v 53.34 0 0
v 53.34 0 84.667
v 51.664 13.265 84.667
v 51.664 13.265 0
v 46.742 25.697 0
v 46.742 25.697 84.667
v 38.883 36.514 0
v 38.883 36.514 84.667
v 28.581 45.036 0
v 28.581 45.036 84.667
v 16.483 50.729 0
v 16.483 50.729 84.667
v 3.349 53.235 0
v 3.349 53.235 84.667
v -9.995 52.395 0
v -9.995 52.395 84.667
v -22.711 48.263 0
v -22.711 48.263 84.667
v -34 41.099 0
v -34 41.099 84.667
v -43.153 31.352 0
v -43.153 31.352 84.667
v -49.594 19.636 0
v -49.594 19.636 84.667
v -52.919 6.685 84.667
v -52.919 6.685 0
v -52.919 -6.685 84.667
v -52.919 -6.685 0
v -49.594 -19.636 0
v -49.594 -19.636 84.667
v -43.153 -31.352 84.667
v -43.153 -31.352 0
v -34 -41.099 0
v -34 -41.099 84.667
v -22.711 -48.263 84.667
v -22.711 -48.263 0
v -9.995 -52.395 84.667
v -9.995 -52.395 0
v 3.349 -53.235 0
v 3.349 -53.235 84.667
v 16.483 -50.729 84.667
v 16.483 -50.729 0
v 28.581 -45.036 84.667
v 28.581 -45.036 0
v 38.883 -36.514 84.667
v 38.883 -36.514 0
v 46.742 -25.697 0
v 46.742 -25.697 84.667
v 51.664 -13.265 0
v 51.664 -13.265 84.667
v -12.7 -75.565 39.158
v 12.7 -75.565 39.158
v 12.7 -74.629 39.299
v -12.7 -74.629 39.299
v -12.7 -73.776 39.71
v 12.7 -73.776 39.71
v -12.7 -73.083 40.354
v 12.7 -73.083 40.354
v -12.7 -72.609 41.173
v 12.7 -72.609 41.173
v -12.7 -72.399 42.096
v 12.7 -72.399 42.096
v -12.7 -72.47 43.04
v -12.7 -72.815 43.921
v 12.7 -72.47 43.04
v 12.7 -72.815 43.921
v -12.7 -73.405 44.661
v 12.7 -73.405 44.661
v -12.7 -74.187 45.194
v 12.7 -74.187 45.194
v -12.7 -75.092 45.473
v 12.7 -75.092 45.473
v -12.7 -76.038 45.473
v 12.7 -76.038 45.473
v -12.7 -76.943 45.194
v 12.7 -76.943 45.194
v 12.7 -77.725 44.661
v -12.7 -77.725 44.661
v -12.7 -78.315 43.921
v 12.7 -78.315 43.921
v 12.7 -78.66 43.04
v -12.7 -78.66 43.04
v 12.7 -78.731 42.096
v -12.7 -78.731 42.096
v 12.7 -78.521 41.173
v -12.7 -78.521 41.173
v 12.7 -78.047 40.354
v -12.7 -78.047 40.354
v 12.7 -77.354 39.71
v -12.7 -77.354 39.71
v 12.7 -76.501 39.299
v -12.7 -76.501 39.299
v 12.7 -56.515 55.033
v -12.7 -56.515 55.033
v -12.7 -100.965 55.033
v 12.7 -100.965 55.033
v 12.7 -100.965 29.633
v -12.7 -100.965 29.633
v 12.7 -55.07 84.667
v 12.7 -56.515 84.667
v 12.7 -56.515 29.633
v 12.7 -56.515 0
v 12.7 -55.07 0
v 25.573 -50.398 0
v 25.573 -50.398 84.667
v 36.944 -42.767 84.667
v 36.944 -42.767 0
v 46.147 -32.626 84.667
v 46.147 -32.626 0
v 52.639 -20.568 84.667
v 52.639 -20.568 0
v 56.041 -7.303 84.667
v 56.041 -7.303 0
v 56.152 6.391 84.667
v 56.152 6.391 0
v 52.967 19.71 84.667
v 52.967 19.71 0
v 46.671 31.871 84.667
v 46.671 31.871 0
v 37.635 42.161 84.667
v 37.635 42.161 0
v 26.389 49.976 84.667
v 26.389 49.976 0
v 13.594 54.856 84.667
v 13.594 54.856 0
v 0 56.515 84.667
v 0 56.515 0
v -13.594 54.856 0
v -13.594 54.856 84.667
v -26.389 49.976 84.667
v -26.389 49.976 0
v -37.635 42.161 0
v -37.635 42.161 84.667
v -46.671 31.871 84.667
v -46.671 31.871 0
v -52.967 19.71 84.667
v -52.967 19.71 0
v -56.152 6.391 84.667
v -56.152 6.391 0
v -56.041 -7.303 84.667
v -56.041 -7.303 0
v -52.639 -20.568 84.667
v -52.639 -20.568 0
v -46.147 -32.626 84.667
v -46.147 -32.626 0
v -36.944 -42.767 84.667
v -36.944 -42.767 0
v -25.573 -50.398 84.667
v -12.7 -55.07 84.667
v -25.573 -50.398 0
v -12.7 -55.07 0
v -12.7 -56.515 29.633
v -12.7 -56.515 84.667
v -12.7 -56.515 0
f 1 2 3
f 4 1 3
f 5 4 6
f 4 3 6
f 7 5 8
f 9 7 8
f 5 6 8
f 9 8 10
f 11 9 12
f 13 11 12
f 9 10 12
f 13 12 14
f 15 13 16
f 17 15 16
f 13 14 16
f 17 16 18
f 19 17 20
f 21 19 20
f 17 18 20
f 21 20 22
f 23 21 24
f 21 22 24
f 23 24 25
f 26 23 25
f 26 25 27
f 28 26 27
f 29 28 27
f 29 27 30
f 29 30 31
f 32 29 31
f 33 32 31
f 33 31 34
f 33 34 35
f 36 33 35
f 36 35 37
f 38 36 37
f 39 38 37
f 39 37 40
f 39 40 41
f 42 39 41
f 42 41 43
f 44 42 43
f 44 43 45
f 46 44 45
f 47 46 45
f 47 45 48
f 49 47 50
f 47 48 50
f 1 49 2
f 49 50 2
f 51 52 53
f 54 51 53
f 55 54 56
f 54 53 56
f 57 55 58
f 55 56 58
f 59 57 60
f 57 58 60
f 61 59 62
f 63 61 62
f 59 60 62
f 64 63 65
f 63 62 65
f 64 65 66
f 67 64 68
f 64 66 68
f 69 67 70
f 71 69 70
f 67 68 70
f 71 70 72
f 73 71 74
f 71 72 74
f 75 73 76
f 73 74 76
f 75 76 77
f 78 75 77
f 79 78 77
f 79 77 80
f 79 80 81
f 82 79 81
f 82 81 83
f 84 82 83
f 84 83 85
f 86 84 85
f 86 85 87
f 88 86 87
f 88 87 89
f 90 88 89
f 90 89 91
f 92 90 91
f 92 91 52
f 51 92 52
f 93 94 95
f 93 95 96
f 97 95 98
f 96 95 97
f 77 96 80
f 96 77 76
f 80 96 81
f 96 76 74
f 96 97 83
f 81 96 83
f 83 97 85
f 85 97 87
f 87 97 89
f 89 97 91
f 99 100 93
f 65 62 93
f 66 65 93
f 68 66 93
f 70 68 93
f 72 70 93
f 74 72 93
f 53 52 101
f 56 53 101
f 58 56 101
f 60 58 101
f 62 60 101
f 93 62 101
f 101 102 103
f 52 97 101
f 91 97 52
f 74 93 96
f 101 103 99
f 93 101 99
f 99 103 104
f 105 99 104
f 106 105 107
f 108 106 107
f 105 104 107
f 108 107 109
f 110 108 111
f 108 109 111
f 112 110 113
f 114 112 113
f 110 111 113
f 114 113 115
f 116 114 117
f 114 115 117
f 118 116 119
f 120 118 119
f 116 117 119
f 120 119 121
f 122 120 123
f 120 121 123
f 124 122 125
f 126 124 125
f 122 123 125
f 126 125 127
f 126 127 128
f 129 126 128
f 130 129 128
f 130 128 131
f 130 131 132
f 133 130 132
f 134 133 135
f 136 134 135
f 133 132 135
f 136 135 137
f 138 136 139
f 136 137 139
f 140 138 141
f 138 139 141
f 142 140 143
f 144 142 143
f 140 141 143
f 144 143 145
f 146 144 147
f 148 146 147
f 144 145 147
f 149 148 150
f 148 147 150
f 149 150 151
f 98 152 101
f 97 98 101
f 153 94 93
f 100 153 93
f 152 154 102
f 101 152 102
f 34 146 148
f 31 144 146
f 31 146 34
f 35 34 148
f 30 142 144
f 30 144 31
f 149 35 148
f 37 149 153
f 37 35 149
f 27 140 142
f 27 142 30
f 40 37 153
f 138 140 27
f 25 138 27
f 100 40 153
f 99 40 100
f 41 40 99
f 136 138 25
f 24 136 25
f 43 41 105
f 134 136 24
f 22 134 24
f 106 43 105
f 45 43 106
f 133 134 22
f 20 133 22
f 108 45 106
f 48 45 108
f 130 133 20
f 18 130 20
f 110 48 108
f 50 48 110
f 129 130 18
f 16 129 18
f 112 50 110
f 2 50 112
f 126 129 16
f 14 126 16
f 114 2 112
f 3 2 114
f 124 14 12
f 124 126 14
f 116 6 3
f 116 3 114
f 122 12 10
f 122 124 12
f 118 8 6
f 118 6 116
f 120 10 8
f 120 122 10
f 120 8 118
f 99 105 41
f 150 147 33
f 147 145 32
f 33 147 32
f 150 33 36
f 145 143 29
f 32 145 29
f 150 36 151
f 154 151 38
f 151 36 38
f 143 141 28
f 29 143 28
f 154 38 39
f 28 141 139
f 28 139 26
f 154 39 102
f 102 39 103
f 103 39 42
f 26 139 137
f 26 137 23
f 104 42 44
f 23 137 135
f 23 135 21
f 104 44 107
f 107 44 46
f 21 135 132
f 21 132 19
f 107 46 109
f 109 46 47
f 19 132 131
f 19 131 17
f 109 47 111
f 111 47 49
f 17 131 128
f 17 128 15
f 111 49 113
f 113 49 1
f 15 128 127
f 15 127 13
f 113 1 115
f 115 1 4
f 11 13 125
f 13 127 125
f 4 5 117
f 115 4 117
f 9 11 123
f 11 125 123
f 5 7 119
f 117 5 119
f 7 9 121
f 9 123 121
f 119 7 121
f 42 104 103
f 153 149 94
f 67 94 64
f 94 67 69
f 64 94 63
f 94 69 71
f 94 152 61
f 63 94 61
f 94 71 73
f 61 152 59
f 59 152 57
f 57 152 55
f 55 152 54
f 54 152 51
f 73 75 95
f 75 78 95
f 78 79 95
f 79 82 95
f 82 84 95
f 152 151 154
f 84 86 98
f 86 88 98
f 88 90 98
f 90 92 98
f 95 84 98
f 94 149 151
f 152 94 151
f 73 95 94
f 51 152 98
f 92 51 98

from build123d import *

# Parameters (mm, degrees)
BOSS_EXTRUDE1_DEPTH = 84.666666667
SKETCH2_R           = 53.34
CUT_EXTRUDE1_DEPTH  = 85.666666667
SKETCH3_W           = 25.4
SKETCH3_H           = 25.4
BOSS_EXTRUDE2_DEPTH = 44.45
SKETCH5_R           = 3.175
CUT_EXTRUDE2_DEPTH  = 70.215


with BuildPart() as part:
    # Sketch1 → Boss-Extrude1 (new body)
    with BuildSketch(Plane.XY):
        with BuildLine():
            Line((-12.7, -56.515), (12.7, -56.515))
            Line((12.7, -56.515), (12.7, -55.069548981))
            ThreePointArc((12.7, -55.069548981), (0, 56.515), (-12.7, -55.069548981))
            Line((-12.7, -55.069548981), (-12.7, -56.515))
        make_face()
    extrude(amount=BOSS_EXTRUDE1_DEPTH)

    # Sketch2 → Cut-Extrude1 (cut, through all)
    with BuildSketch(Plane.XY.offset(84.666666667)):
        Circle(SKETCH2_R)
    extrude(amount=-CUT_EXTRUDE1_DEPTH, mode=Mode.SUBTRACT)

    # Sketch3 → Boss-Extrude2 (add)
    with BuildSketch(Plane.XZ.offset(56.515)):
        with Locations((0, 42.333333333)):
            Rectangle(SKETCH3_W, SKETCH3_H)
    extrude(amount=BOSS_EXTRUDE2_DEPTH)

    # Sketch5 → Cut-Extrude2 (cut, through all)
    with BuildSketch(Plane(origin=(12.7, 0, 0), x_dir=(0, 0, -1), z_dir=(1, 0, 0))):
        with Locations((-42.333333333, -75.565)):
            Circle(SKETCH5_R)
    extrude(amount=-CUT_EXTRUDE2_DEPTH, mode=Mode.SUBTRACT)


solid = part.part
